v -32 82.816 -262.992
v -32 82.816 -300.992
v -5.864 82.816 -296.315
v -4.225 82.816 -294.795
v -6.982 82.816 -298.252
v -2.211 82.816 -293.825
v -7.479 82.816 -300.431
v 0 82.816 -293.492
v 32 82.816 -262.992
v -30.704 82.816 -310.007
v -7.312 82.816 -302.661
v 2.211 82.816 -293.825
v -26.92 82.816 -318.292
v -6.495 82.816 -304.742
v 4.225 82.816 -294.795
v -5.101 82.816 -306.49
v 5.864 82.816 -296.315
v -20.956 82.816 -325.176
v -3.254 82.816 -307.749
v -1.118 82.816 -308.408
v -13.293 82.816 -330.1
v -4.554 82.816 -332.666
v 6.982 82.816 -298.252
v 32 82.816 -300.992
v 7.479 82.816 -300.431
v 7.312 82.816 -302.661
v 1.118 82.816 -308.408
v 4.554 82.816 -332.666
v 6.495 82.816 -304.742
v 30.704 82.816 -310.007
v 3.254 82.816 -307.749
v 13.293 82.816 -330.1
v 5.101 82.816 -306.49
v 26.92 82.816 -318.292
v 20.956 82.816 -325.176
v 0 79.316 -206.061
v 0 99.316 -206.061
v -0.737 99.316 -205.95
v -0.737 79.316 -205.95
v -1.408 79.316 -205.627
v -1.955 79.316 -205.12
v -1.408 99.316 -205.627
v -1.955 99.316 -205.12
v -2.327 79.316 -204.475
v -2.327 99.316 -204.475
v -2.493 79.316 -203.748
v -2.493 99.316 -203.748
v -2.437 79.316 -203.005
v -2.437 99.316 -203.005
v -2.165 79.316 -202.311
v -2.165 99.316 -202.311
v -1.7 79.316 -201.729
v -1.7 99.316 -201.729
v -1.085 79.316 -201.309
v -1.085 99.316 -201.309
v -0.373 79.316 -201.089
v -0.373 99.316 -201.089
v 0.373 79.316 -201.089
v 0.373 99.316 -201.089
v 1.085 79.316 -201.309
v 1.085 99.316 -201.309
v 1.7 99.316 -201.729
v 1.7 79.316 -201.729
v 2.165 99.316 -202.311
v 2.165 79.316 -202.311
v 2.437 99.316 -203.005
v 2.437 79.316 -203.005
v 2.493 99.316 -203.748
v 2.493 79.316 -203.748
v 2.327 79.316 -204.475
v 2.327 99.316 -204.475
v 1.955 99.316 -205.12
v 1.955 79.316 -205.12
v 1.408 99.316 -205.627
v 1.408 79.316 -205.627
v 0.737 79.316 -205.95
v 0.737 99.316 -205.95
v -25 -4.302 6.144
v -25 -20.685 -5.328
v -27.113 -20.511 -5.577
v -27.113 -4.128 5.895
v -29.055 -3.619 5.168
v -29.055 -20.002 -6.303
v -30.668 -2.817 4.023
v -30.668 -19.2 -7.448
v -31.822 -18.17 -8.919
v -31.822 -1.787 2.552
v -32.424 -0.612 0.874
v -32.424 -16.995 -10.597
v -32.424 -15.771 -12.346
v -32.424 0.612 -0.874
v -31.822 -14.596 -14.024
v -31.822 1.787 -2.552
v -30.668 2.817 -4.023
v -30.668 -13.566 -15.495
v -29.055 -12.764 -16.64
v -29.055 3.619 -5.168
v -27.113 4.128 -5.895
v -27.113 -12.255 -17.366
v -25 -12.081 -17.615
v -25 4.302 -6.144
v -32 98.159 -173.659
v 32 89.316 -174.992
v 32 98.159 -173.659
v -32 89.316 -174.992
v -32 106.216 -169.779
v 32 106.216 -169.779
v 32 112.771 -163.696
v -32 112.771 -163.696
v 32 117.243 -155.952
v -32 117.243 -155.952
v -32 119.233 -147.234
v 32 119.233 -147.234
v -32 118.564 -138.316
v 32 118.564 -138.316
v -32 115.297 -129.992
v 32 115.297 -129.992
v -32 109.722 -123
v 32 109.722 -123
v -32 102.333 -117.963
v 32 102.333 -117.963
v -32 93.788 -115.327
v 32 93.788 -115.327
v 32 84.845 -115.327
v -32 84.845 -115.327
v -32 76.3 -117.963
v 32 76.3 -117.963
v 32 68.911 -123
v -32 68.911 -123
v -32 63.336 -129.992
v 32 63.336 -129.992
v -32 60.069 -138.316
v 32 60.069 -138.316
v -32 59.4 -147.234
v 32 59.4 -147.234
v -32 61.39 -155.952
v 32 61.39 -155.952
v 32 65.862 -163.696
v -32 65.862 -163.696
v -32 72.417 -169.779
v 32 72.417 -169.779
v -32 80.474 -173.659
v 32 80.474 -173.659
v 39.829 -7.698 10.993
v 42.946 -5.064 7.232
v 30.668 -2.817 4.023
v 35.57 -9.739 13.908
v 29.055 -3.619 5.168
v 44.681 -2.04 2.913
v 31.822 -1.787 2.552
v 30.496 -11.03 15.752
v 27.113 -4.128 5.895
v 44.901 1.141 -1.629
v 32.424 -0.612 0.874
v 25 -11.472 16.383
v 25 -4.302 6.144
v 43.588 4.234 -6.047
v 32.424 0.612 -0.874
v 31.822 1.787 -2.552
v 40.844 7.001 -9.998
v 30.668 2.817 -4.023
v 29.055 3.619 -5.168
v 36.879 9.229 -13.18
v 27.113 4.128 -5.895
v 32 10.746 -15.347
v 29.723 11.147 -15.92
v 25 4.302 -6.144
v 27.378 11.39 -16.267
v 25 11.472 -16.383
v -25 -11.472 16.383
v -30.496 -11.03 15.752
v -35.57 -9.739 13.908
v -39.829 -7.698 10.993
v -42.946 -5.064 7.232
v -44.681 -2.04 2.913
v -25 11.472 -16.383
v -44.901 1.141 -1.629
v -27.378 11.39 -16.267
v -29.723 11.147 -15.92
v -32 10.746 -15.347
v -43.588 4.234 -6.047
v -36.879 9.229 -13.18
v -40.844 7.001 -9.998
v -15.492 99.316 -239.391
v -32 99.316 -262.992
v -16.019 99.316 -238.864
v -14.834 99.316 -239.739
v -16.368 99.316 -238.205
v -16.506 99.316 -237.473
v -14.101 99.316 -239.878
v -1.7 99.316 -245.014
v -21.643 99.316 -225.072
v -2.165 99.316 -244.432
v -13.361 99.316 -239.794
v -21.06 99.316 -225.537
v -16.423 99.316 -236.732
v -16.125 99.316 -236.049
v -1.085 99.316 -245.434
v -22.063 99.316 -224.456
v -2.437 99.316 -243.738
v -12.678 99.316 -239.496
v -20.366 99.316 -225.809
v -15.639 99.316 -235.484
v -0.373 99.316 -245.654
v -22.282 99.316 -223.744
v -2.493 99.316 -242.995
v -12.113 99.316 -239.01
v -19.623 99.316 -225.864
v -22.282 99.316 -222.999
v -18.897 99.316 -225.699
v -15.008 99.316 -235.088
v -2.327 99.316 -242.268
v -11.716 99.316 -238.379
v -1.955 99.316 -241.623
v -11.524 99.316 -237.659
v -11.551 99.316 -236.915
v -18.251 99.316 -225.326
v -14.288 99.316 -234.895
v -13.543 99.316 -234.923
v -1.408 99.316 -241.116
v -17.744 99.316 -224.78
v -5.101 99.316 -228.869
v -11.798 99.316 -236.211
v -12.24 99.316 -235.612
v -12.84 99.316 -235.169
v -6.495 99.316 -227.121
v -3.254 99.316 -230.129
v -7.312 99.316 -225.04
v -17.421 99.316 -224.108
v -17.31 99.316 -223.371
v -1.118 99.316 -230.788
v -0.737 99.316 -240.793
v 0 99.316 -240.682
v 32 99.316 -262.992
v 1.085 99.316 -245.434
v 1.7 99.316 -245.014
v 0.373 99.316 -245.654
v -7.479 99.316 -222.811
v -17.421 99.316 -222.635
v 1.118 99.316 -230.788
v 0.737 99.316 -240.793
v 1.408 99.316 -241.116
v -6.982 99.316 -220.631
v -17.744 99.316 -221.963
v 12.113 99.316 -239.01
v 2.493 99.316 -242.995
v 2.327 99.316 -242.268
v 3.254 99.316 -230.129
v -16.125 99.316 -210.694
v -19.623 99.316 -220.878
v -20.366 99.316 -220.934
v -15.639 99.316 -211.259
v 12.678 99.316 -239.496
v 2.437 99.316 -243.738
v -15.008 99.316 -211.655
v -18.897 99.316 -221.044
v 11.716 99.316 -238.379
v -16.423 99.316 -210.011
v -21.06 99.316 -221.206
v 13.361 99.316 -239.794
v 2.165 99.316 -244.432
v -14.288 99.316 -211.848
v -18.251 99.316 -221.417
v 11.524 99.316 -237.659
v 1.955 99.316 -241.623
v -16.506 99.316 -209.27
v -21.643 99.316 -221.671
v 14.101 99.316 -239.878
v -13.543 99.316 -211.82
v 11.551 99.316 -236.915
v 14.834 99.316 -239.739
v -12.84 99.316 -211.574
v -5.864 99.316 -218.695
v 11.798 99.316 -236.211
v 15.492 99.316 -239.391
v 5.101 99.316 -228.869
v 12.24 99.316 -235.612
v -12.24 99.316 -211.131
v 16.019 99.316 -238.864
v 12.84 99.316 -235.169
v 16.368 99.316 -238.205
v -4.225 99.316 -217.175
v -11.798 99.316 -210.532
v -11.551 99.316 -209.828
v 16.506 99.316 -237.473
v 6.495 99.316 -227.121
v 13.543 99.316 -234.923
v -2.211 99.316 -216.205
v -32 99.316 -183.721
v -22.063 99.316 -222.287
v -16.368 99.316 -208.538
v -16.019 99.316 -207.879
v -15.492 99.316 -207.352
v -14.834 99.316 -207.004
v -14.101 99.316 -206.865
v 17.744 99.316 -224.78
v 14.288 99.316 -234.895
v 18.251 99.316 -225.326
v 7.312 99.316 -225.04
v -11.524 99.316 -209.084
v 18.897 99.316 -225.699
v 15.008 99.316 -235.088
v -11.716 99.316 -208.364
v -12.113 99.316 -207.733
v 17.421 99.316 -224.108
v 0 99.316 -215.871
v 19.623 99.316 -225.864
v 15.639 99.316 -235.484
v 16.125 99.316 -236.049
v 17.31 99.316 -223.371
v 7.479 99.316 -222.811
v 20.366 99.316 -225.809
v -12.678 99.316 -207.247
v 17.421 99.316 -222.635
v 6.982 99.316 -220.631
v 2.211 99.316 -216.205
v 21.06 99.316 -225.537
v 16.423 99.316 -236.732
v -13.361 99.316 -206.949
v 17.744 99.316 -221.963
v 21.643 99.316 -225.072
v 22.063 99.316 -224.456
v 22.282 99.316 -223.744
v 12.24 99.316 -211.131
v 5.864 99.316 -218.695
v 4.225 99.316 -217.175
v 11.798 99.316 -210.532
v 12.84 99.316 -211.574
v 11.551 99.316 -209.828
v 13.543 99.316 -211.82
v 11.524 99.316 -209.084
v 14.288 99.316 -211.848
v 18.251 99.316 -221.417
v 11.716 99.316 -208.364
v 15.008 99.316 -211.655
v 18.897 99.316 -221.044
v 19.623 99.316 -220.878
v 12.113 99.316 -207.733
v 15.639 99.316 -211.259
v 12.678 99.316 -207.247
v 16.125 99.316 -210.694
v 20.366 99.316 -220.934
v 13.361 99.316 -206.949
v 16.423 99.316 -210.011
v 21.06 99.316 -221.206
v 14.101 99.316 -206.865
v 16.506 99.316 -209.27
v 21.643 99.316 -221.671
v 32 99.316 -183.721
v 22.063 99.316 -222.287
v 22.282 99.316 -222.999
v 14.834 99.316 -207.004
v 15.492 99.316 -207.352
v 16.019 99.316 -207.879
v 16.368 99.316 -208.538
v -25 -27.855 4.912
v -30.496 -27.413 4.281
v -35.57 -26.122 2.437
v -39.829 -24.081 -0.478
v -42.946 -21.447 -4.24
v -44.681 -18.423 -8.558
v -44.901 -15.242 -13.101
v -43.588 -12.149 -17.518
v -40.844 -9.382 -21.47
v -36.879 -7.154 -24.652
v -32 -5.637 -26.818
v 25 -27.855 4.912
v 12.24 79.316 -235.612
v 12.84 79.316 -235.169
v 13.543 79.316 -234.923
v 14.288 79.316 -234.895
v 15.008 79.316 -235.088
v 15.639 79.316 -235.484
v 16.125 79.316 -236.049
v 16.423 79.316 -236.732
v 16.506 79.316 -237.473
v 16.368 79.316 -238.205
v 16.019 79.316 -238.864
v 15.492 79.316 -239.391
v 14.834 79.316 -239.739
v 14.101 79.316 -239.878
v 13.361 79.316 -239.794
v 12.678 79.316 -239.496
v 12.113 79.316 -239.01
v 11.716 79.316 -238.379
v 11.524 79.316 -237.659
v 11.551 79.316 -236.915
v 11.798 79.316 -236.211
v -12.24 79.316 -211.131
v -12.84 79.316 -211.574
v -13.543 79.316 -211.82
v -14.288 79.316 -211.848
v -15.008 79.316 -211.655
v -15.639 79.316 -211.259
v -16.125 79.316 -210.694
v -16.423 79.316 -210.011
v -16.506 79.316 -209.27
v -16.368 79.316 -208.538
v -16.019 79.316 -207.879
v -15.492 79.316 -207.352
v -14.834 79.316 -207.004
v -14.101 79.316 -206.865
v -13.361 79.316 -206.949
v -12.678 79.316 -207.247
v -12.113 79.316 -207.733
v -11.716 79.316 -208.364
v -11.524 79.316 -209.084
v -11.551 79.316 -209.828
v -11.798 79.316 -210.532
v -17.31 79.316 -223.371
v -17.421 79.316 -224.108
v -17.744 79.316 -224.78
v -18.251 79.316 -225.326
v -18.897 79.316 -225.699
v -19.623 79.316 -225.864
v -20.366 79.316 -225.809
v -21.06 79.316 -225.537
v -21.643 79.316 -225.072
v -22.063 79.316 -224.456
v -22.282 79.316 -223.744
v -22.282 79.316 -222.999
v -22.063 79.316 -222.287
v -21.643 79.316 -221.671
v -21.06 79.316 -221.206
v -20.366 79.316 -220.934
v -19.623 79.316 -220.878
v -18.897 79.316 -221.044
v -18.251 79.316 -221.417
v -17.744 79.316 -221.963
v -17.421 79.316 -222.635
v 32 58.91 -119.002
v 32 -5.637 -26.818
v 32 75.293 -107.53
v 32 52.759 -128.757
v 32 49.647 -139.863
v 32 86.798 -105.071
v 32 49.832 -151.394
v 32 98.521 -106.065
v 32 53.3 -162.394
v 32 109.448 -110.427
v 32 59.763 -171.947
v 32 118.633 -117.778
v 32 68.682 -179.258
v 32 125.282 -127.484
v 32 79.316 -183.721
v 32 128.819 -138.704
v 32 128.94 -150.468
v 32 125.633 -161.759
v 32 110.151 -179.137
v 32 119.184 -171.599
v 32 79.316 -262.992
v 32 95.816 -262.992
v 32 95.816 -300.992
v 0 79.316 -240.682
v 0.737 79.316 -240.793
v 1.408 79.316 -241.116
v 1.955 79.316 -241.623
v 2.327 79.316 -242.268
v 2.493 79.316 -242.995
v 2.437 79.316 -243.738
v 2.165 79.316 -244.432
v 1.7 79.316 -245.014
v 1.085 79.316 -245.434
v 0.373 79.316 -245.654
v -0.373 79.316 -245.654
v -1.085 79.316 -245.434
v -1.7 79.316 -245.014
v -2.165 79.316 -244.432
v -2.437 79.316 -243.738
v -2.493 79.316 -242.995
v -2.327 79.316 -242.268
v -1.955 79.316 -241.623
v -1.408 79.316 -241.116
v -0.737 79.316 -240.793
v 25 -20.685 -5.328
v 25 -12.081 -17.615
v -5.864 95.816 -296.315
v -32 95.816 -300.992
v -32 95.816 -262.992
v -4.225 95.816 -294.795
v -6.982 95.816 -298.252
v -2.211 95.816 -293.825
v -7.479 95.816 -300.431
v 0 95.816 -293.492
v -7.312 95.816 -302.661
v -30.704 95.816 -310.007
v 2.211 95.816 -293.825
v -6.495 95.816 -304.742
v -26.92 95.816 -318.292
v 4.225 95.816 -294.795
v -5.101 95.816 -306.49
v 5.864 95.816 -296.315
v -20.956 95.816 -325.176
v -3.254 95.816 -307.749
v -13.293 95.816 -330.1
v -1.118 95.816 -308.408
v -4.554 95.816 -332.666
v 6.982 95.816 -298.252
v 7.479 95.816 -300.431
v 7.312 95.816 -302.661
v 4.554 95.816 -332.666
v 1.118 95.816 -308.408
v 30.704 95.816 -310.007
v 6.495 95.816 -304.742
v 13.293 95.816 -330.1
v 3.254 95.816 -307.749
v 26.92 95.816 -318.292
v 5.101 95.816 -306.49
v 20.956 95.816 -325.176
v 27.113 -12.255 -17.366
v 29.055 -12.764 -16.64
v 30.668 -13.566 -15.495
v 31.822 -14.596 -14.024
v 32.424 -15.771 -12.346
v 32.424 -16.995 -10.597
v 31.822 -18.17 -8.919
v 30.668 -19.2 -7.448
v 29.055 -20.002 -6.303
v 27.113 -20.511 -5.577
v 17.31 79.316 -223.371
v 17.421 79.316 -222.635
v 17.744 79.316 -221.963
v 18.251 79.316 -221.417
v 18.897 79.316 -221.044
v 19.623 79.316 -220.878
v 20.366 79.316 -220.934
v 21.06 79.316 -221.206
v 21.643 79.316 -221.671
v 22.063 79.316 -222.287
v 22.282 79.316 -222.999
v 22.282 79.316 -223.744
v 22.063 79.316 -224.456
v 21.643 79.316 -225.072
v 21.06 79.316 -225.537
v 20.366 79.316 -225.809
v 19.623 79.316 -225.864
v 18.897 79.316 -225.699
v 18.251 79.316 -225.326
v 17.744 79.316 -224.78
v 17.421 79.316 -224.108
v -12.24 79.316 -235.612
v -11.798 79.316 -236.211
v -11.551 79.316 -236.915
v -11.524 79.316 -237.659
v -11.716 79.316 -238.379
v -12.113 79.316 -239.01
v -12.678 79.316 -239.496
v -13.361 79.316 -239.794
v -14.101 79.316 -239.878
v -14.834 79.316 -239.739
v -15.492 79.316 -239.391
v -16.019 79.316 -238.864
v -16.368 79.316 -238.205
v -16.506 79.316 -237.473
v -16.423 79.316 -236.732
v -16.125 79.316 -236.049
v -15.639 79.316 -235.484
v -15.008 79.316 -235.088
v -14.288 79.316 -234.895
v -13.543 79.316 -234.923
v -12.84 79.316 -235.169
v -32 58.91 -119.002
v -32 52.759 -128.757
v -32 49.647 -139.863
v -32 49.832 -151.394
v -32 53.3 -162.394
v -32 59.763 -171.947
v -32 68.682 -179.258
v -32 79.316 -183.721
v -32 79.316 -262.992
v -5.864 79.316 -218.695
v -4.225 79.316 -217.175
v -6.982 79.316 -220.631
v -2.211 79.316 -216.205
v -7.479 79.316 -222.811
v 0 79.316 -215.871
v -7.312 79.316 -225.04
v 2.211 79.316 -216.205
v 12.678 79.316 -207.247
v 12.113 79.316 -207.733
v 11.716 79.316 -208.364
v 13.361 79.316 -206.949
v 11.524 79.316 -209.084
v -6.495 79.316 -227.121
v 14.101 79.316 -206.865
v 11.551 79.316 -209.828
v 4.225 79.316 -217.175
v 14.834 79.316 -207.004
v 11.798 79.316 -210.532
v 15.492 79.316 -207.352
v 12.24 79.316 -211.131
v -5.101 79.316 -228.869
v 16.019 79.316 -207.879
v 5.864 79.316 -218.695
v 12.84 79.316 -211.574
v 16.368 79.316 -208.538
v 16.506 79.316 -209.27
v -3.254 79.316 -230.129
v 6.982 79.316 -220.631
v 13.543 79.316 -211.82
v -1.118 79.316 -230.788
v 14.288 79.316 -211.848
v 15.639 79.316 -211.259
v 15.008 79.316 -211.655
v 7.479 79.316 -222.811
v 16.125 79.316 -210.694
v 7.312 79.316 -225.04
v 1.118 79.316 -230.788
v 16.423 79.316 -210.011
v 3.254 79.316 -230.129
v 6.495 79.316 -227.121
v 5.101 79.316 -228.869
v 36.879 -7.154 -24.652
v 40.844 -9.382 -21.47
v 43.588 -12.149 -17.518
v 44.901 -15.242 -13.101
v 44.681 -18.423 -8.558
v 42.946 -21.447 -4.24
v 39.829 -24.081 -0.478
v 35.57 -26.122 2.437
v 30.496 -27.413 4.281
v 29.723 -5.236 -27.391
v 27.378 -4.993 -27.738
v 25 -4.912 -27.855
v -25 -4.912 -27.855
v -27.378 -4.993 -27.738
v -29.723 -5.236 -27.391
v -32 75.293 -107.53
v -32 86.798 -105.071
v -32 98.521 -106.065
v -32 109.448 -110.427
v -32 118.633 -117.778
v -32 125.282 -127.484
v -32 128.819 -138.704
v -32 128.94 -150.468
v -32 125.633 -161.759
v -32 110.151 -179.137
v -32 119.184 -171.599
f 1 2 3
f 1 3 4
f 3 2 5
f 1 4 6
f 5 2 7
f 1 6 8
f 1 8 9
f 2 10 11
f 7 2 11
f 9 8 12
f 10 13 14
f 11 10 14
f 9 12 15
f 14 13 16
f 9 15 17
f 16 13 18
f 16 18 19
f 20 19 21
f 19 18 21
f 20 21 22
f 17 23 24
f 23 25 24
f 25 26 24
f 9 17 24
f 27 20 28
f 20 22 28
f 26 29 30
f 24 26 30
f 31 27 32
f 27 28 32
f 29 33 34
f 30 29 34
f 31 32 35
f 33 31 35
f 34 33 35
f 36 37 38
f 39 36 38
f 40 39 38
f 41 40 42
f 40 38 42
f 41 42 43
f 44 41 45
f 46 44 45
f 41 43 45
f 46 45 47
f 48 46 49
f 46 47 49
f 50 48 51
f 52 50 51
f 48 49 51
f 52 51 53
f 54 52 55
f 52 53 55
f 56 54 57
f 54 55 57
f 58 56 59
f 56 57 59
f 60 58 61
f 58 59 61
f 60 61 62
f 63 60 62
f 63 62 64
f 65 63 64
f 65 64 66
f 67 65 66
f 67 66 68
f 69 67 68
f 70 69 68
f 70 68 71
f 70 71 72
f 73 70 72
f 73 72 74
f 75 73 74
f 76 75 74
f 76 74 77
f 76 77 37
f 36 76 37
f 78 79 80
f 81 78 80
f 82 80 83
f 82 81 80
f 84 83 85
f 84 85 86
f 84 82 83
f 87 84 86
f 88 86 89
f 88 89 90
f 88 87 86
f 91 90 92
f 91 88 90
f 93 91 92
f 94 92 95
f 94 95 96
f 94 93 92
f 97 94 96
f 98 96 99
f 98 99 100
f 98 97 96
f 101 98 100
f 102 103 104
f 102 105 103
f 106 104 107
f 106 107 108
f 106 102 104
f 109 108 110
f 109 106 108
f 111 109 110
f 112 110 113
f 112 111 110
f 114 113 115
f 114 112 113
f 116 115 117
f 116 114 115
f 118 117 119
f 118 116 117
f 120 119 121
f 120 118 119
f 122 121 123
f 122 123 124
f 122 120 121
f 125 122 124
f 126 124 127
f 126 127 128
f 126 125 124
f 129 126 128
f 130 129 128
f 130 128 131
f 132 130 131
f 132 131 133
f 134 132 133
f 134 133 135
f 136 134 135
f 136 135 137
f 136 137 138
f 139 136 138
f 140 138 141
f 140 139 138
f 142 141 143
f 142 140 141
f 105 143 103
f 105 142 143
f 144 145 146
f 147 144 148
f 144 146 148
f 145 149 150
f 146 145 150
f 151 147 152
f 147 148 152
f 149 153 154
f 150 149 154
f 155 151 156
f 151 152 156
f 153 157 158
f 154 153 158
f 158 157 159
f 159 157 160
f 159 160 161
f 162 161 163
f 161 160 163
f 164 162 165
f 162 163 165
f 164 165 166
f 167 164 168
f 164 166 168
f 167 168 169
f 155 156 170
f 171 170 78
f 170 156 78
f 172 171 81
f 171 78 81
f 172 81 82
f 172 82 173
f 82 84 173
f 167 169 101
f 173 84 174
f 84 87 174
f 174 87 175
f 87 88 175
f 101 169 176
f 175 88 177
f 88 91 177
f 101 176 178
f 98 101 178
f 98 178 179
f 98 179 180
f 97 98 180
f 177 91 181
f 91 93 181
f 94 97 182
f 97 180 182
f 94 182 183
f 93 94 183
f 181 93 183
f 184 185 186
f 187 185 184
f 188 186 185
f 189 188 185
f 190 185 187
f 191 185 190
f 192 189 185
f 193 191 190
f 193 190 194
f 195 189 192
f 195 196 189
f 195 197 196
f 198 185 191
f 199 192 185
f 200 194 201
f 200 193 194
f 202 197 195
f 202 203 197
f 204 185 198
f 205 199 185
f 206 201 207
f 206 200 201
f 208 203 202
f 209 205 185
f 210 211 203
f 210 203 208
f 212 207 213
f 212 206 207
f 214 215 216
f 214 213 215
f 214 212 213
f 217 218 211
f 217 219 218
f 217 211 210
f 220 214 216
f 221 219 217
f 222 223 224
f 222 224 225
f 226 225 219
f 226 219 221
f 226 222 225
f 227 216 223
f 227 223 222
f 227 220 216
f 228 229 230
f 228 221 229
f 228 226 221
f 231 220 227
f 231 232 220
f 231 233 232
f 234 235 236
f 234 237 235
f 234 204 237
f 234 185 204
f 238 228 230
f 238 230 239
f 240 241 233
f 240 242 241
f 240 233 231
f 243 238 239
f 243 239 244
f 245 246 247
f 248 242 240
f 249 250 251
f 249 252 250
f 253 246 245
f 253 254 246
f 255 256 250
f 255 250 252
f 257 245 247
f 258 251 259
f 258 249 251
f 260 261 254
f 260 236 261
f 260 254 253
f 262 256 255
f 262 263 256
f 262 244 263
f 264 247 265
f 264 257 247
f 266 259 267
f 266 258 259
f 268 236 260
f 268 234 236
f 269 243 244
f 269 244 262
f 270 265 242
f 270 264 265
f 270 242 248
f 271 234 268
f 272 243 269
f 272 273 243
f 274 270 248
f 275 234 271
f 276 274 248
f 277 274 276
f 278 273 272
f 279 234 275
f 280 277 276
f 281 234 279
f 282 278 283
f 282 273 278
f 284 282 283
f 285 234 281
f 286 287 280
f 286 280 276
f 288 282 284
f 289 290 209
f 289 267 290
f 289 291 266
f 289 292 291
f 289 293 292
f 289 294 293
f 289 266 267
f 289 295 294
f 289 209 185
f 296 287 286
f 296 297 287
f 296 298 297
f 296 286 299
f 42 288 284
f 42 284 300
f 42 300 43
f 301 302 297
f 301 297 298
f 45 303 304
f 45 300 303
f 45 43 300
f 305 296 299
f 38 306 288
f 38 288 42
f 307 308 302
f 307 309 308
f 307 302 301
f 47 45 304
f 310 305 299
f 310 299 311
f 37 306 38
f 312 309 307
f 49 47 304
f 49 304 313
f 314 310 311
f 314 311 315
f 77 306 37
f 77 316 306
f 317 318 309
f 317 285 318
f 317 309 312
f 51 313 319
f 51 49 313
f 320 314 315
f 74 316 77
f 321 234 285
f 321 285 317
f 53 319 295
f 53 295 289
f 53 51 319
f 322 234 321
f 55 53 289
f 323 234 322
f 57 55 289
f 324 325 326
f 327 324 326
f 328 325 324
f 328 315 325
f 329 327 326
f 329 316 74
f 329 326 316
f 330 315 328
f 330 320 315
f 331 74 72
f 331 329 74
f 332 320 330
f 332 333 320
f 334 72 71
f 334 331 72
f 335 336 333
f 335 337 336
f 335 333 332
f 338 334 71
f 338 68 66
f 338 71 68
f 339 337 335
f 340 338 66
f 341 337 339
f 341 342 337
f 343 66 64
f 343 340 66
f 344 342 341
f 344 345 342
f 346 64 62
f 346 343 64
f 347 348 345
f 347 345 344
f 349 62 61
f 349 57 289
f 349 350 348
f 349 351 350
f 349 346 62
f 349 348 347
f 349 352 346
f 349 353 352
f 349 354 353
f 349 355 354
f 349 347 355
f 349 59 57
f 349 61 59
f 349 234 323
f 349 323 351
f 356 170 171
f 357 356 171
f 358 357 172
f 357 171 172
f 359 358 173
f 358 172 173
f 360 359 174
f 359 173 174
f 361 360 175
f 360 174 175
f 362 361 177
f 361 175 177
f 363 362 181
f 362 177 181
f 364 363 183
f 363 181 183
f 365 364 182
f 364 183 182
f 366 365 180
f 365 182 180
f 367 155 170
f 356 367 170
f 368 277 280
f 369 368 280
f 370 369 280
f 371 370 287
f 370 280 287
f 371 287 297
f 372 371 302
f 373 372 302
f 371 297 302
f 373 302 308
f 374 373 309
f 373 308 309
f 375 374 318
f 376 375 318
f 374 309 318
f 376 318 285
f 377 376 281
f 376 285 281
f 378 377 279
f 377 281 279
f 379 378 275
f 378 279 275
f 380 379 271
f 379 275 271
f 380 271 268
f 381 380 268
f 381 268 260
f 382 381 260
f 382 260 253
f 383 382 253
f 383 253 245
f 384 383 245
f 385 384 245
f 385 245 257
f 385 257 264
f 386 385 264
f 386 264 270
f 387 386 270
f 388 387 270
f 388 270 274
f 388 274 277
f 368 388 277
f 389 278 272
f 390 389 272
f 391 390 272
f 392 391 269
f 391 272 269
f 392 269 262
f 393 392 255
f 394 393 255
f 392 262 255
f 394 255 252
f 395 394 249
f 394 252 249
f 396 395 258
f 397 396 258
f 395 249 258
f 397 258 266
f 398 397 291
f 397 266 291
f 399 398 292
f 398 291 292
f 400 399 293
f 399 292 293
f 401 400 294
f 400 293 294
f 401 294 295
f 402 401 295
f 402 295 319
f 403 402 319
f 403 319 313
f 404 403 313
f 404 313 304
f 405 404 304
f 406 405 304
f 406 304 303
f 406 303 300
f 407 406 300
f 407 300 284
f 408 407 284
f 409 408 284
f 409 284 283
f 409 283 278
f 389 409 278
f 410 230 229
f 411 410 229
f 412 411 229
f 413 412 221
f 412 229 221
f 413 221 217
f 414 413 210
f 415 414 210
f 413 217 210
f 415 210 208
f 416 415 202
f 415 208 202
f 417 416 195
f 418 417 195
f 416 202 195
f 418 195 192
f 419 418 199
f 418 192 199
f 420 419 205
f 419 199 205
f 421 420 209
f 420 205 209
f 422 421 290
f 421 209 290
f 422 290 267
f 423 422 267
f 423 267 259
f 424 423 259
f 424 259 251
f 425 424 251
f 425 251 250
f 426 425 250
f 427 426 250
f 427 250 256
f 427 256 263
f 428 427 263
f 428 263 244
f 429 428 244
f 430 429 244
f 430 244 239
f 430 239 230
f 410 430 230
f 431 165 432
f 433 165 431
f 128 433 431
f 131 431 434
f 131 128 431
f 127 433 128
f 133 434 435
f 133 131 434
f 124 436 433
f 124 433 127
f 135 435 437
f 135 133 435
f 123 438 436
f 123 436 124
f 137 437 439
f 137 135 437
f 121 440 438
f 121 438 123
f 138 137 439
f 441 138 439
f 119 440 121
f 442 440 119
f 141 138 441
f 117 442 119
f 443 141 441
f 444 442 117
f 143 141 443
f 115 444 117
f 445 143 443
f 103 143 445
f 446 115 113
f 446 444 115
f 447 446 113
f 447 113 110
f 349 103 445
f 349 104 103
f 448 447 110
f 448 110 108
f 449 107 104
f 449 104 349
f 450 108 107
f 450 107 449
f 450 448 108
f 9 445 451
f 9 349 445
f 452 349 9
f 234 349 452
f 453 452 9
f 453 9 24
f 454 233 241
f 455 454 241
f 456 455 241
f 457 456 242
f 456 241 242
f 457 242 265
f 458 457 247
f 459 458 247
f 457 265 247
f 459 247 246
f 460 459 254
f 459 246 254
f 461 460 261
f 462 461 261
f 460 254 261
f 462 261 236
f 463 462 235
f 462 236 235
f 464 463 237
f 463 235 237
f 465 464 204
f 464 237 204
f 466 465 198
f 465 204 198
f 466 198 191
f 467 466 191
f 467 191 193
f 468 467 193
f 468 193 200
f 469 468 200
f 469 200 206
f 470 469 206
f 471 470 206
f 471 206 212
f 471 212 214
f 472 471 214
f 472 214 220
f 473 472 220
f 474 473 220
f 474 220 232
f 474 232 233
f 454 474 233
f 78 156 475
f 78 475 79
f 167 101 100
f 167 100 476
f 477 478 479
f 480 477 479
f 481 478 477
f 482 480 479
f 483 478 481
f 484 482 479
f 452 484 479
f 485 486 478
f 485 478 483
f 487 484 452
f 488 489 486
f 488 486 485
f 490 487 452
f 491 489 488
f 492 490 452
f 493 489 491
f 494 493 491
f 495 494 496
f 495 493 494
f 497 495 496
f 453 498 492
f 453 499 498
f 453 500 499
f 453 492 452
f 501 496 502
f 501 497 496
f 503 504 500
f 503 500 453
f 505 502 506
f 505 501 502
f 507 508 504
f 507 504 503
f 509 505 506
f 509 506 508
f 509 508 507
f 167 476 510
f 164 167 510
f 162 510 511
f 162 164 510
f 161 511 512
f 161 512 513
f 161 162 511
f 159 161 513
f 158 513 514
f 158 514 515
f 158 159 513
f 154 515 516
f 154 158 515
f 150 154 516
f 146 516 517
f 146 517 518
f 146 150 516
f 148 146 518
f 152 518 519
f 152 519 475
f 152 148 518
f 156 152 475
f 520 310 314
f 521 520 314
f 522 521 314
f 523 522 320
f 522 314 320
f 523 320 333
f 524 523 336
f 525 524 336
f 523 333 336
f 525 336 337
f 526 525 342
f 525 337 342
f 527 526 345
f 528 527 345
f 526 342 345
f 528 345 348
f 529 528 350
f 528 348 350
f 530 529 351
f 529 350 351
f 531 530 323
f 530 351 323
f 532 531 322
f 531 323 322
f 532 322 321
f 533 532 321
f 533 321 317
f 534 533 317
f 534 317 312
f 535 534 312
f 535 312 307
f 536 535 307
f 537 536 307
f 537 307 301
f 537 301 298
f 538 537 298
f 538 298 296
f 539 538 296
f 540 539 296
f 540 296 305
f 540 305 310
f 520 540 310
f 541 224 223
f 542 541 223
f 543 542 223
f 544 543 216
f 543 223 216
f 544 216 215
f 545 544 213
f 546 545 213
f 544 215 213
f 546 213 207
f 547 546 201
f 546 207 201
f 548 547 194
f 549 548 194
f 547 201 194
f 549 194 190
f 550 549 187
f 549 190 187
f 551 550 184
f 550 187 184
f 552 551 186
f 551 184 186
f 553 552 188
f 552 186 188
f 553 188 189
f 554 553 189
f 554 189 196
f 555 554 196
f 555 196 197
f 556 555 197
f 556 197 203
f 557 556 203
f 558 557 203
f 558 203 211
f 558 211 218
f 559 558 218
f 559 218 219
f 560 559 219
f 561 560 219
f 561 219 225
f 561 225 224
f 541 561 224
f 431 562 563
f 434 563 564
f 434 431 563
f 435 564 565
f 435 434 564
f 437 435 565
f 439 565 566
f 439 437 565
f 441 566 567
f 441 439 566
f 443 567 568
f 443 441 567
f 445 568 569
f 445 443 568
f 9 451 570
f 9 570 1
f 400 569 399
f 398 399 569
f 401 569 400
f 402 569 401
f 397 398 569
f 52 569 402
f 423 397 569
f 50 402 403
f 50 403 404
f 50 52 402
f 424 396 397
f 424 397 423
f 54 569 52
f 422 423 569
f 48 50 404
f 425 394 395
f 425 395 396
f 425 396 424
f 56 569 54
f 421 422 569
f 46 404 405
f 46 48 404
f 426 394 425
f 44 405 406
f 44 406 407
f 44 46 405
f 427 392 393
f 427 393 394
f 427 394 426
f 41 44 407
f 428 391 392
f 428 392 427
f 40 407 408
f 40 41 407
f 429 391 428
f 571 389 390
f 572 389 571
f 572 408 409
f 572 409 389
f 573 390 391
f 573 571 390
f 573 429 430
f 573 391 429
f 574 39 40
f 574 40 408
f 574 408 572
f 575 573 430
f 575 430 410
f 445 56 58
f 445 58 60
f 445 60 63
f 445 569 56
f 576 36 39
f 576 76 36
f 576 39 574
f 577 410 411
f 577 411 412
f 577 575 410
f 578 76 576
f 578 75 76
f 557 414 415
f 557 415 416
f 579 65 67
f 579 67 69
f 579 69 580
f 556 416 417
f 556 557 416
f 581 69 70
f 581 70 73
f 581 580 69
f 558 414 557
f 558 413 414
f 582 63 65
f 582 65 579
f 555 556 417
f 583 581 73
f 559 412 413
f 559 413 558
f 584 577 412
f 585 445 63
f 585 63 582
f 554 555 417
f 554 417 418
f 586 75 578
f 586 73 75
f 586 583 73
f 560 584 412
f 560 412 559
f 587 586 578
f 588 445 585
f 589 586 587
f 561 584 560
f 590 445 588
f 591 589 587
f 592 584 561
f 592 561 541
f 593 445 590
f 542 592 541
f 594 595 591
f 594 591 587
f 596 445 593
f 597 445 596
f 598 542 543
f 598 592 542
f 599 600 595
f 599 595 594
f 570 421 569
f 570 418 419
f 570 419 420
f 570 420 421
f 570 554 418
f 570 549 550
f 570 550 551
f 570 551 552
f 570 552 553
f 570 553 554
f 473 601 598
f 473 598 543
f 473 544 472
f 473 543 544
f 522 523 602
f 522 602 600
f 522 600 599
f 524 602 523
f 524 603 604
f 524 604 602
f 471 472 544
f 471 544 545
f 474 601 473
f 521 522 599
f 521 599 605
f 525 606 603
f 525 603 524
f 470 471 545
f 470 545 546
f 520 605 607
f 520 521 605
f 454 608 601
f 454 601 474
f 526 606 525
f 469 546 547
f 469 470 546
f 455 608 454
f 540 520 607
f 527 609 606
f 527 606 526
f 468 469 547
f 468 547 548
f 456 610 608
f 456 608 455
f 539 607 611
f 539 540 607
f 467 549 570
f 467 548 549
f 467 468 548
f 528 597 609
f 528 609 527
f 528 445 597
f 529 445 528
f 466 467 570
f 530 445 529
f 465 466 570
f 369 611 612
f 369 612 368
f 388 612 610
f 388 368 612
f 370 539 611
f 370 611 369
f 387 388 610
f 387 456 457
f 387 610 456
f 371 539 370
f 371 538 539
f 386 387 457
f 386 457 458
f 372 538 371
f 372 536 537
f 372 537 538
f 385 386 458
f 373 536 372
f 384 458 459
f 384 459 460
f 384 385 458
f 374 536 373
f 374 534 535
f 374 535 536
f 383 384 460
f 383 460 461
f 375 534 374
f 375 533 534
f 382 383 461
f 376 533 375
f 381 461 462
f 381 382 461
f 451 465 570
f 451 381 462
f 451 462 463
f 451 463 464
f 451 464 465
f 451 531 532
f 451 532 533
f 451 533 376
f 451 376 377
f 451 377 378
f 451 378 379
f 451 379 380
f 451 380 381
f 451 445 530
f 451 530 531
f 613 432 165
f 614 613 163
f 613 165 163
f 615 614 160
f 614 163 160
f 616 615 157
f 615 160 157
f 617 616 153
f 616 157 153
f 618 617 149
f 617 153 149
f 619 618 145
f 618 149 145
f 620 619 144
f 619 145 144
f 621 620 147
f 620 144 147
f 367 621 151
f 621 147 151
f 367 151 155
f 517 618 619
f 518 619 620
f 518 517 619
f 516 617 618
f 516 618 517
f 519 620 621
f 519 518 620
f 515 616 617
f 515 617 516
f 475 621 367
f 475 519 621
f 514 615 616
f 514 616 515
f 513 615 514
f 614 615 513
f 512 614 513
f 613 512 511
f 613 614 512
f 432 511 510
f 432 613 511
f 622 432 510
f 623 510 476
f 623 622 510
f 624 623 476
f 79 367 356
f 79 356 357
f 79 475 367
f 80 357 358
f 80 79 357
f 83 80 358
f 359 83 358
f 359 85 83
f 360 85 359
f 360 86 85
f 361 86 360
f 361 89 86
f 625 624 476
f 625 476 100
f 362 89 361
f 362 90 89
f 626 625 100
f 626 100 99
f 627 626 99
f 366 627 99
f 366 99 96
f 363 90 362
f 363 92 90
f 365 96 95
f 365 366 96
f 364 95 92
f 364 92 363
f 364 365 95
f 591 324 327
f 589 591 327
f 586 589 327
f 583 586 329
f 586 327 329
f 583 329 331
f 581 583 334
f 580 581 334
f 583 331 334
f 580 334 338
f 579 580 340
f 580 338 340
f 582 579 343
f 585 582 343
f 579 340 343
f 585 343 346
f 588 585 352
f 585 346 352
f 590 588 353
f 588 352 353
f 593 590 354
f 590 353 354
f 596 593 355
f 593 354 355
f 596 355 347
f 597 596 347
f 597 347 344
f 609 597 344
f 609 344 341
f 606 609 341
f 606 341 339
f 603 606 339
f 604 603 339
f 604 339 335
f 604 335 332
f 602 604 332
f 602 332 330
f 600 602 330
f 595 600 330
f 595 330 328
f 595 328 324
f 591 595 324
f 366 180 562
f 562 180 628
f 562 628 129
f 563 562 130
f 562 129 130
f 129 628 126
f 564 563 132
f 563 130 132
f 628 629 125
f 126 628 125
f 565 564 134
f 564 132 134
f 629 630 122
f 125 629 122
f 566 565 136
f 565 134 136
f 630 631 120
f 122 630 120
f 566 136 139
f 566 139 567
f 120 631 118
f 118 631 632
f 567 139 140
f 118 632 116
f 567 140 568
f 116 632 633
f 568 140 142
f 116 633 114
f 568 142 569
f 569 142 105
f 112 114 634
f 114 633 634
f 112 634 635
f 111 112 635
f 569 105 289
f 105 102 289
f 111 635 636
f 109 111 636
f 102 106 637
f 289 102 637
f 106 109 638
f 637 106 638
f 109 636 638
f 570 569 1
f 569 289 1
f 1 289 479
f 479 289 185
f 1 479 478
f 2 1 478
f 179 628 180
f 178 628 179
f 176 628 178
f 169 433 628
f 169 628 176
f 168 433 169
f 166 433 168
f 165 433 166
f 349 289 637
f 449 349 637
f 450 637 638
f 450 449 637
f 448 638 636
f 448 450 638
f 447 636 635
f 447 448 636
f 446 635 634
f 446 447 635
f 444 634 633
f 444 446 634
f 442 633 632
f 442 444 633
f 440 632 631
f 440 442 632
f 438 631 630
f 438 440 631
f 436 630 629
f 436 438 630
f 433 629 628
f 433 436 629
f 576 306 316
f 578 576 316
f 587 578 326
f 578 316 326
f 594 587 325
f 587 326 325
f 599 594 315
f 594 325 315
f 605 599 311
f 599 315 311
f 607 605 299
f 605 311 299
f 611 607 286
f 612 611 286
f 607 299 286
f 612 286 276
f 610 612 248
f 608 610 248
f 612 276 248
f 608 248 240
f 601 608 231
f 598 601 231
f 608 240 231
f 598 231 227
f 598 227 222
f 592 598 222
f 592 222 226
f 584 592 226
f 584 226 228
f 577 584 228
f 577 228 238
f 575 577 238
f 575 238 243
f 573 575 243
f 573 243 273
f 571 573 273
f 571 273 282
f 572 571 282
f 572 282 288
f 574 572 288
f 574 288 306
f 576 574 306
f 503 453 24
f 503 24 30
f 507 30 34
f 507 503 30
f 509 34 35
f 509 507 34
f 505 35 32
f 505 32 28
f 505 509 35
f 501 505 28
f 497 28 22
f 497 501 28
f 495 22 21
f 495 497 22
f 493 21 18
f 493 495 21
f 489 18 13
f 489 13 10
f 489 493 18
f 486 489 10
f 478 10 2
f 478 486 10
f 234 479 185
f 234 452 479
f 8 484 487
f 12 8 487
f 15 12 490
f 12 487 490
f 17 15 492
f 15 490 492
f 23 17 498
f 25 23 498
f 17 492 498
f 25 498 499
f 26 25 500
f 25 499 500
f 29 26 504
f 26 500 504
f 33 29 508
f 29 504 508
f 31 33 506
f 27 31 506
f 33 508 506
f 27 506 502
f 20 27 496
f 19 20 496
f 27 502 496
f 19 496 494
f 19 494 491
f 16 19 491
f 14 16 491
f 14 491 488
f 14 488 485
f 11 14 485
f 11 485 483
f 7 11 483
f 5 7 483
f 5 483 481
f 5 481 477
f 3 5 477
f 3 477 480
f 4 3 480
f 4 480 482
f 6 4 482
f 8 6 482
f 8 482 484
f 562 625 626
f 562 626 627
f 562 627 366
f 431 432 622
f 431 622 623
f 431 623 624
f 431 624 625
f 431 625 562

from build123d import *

# Parameters (mm, degrees)
SKETCH1_R           = 30
BOSS_EXTRUDE1_DEPTH = 32
CUT_EXTRUDE1_DEPTH  = 64
BOSS_EXTRUDE2_DEPTH = 20
SKETCH4_R           = 7.5
SKETCH4_R_2         = 2.5
CUT_EXTRUDE2_DEPTH  = 64
CIRPATTERN1_COUNT   = 8
BOSS_EXTRUDE3_DEPTH = 13
SKETCH6_R           = 7.5
CUT_EXTRUDE3_DEPTH  = 64


with BuildPart() as part:
    # Sketch1 → Boss-Extrude1 (new, symmetric)
    with BuildSketch(Plane(origin=(0, 0, 0), x_dir=(0, 0, -1), z_dir=(1, 0, 0))):
        with BuildLine():
            Line((0, 0), (11.471528727, -16.383040886))
            Line((11.471528727, -16.383040886), (119.001754001, 58.910433436))
            ThreePointArc((119.001754001, 58.910433436), (157.019843873, 51.167795707), (183.721445355, 79.316473737))
            Line((183.721445355, 79.316473737), (262.991611893, 79.316473737))
            Line((262.991611893, 79.316473737), (262.991611893, 82.816473737))
            Line((262.991611893, 82.816473737), (300.991611893, 82.816473737))
            Line((300.991611893, 82.816473737), (300.991611893, 95.816473737))
            Line((300.991611893, 95.816473737), (262.991611893, 95.816473737))
            Line((262.991611893, 95.816473737), (262.991611893, 99.316473737))
            Line((262.991611893, 99.316473737), (183.721445355, 99.316473737))
            ThreePointArc((183.721445355, 99.316473737), (132.963379912, 127.465151767), (107.530225274, 75.293474322))
            Line((107.530225274, 75.293474322), (0, 0))
        make_face()
        with Locations((144.991611893, 89.316473737)):
            Circle(SKETCH1_R, mode=Mode.SUBTRACT)
    extrude(amount=BOSS_EXTRUDE1_DEPTH, both=True)

    # Sketch2 → Cut-Extrude1 (cut)
    with BuildSketch(Plane(origin=(0, 0, 0), x_dir=(1, 0, 0), z_dir=(0, 0.8191520442889949, 0.5735764363510418))):
        with BuildLine():
            Line((25, -20), (-25, -20))
            ThreePointArc((-25, -20), (-45, 0), (-25, 20))
            Line((-25, 20), (25, 20))
            ThreePointArc((25, 20), (45, 0), (25, -20))
        make_face()
    extrude(amount=-CUT_EXTRUDE1_DEPTH, mode=Mode.SUBTRACT)

    # Sketch3 → Boss-Extrude2 (add)
    with BuildSketch(Plane(origin=(0, 0, 0), x_dir=(1, 0, 0), z_dir=(0, 0.8191520442889949, 0.5735764363510418))):
        with BuildLine():
            Line((25, -20), (-25, -20))
            ThreePointArc((-25, -20), (-45, 0), (-25, 20))
            Line((-25, 20), (25, 20))
            ThreePointArc((25, 20), (45, 0), (25, -20))
        make_face()
        with BuildLine():
            Line((25, -7.5), (-25, -7.5))
            ThreePointArc((-25, -7.5), (-32.5, 0), (-25, 7.5))
            Line((-25, 7.5), (25, 7.5))
            ThreePointArc((25, 7.5), (32.5, 0), (25, -7.5))
        make_face(mode=Mode.SUBTRACT)
    extrude(amount=-BOSS_EXTRUDE2_DEPTH)

    # Sketch4 → Cut-Extrude2 (cut)
    with BuildSketch(Plane(origin=(0, 99.316473737, 0), x_dir=(1, 0, 0), z_dir=(0, 1, 0))):
        with Locations(Location((0, 223.371445355, 0), (0, 0, 270))):
            Circle(SKETCH4_R)
        with Locations(Location((0, 243.181528624, 0), (0, 0, 270))):
            Circle(SKETCH4_R_2)
    cut_extrude2 = extrude(amount=-CUT_EXTRUDE2_DEPTH, mode=Mode.SUBTRACT)

    # CirPattern1: Cut-Extrude2 ×8 about axis
    cirpattern1_axis = Axis((0, 0, -223.371445355), (0, 1, 0))
    for i in range(1, CIRPATTERN1_COUNT):
        add(cut_extrude2.rotate(cirpattern1_axis, i * 360 / CIRPATTERN1_COUNT), mode=Mode.SUBTRACT)

    # Sketch5 → Boss-Extrude3 (add)
    with BuildSketch(Plane(origin=(0, 95.816473737, 0), x_dir=(1, 0, 0), z_dir=(0, 1, 0))):
        with BuildLine():
            Line((-32, 300.991611893), (32, 300.991611893))
            ThreePointArc((32, 300.991611893), (0, 332.991611893), (-32, 300.991611893))
        make_face()
    extrude(amount=-BOSS_EXTRUDE3_DEPTH)

    # Sketch6 → Cut-Extrude3 (cut)
    with BuildSketch(Plane(origin=(0, 95.816473737, 0), x_dir=(1, 0, 0), z_dir=(0, 1, 0))):
        with Locations(Location((0, 300.991611893, 0), (0, 0, 270))):
            Circle(SKETCH6_R)
    extrude(amount=-CUT_EXTRUDE3_DEPTH, mode=Mode.SUBTRACT)


solid = part.part
